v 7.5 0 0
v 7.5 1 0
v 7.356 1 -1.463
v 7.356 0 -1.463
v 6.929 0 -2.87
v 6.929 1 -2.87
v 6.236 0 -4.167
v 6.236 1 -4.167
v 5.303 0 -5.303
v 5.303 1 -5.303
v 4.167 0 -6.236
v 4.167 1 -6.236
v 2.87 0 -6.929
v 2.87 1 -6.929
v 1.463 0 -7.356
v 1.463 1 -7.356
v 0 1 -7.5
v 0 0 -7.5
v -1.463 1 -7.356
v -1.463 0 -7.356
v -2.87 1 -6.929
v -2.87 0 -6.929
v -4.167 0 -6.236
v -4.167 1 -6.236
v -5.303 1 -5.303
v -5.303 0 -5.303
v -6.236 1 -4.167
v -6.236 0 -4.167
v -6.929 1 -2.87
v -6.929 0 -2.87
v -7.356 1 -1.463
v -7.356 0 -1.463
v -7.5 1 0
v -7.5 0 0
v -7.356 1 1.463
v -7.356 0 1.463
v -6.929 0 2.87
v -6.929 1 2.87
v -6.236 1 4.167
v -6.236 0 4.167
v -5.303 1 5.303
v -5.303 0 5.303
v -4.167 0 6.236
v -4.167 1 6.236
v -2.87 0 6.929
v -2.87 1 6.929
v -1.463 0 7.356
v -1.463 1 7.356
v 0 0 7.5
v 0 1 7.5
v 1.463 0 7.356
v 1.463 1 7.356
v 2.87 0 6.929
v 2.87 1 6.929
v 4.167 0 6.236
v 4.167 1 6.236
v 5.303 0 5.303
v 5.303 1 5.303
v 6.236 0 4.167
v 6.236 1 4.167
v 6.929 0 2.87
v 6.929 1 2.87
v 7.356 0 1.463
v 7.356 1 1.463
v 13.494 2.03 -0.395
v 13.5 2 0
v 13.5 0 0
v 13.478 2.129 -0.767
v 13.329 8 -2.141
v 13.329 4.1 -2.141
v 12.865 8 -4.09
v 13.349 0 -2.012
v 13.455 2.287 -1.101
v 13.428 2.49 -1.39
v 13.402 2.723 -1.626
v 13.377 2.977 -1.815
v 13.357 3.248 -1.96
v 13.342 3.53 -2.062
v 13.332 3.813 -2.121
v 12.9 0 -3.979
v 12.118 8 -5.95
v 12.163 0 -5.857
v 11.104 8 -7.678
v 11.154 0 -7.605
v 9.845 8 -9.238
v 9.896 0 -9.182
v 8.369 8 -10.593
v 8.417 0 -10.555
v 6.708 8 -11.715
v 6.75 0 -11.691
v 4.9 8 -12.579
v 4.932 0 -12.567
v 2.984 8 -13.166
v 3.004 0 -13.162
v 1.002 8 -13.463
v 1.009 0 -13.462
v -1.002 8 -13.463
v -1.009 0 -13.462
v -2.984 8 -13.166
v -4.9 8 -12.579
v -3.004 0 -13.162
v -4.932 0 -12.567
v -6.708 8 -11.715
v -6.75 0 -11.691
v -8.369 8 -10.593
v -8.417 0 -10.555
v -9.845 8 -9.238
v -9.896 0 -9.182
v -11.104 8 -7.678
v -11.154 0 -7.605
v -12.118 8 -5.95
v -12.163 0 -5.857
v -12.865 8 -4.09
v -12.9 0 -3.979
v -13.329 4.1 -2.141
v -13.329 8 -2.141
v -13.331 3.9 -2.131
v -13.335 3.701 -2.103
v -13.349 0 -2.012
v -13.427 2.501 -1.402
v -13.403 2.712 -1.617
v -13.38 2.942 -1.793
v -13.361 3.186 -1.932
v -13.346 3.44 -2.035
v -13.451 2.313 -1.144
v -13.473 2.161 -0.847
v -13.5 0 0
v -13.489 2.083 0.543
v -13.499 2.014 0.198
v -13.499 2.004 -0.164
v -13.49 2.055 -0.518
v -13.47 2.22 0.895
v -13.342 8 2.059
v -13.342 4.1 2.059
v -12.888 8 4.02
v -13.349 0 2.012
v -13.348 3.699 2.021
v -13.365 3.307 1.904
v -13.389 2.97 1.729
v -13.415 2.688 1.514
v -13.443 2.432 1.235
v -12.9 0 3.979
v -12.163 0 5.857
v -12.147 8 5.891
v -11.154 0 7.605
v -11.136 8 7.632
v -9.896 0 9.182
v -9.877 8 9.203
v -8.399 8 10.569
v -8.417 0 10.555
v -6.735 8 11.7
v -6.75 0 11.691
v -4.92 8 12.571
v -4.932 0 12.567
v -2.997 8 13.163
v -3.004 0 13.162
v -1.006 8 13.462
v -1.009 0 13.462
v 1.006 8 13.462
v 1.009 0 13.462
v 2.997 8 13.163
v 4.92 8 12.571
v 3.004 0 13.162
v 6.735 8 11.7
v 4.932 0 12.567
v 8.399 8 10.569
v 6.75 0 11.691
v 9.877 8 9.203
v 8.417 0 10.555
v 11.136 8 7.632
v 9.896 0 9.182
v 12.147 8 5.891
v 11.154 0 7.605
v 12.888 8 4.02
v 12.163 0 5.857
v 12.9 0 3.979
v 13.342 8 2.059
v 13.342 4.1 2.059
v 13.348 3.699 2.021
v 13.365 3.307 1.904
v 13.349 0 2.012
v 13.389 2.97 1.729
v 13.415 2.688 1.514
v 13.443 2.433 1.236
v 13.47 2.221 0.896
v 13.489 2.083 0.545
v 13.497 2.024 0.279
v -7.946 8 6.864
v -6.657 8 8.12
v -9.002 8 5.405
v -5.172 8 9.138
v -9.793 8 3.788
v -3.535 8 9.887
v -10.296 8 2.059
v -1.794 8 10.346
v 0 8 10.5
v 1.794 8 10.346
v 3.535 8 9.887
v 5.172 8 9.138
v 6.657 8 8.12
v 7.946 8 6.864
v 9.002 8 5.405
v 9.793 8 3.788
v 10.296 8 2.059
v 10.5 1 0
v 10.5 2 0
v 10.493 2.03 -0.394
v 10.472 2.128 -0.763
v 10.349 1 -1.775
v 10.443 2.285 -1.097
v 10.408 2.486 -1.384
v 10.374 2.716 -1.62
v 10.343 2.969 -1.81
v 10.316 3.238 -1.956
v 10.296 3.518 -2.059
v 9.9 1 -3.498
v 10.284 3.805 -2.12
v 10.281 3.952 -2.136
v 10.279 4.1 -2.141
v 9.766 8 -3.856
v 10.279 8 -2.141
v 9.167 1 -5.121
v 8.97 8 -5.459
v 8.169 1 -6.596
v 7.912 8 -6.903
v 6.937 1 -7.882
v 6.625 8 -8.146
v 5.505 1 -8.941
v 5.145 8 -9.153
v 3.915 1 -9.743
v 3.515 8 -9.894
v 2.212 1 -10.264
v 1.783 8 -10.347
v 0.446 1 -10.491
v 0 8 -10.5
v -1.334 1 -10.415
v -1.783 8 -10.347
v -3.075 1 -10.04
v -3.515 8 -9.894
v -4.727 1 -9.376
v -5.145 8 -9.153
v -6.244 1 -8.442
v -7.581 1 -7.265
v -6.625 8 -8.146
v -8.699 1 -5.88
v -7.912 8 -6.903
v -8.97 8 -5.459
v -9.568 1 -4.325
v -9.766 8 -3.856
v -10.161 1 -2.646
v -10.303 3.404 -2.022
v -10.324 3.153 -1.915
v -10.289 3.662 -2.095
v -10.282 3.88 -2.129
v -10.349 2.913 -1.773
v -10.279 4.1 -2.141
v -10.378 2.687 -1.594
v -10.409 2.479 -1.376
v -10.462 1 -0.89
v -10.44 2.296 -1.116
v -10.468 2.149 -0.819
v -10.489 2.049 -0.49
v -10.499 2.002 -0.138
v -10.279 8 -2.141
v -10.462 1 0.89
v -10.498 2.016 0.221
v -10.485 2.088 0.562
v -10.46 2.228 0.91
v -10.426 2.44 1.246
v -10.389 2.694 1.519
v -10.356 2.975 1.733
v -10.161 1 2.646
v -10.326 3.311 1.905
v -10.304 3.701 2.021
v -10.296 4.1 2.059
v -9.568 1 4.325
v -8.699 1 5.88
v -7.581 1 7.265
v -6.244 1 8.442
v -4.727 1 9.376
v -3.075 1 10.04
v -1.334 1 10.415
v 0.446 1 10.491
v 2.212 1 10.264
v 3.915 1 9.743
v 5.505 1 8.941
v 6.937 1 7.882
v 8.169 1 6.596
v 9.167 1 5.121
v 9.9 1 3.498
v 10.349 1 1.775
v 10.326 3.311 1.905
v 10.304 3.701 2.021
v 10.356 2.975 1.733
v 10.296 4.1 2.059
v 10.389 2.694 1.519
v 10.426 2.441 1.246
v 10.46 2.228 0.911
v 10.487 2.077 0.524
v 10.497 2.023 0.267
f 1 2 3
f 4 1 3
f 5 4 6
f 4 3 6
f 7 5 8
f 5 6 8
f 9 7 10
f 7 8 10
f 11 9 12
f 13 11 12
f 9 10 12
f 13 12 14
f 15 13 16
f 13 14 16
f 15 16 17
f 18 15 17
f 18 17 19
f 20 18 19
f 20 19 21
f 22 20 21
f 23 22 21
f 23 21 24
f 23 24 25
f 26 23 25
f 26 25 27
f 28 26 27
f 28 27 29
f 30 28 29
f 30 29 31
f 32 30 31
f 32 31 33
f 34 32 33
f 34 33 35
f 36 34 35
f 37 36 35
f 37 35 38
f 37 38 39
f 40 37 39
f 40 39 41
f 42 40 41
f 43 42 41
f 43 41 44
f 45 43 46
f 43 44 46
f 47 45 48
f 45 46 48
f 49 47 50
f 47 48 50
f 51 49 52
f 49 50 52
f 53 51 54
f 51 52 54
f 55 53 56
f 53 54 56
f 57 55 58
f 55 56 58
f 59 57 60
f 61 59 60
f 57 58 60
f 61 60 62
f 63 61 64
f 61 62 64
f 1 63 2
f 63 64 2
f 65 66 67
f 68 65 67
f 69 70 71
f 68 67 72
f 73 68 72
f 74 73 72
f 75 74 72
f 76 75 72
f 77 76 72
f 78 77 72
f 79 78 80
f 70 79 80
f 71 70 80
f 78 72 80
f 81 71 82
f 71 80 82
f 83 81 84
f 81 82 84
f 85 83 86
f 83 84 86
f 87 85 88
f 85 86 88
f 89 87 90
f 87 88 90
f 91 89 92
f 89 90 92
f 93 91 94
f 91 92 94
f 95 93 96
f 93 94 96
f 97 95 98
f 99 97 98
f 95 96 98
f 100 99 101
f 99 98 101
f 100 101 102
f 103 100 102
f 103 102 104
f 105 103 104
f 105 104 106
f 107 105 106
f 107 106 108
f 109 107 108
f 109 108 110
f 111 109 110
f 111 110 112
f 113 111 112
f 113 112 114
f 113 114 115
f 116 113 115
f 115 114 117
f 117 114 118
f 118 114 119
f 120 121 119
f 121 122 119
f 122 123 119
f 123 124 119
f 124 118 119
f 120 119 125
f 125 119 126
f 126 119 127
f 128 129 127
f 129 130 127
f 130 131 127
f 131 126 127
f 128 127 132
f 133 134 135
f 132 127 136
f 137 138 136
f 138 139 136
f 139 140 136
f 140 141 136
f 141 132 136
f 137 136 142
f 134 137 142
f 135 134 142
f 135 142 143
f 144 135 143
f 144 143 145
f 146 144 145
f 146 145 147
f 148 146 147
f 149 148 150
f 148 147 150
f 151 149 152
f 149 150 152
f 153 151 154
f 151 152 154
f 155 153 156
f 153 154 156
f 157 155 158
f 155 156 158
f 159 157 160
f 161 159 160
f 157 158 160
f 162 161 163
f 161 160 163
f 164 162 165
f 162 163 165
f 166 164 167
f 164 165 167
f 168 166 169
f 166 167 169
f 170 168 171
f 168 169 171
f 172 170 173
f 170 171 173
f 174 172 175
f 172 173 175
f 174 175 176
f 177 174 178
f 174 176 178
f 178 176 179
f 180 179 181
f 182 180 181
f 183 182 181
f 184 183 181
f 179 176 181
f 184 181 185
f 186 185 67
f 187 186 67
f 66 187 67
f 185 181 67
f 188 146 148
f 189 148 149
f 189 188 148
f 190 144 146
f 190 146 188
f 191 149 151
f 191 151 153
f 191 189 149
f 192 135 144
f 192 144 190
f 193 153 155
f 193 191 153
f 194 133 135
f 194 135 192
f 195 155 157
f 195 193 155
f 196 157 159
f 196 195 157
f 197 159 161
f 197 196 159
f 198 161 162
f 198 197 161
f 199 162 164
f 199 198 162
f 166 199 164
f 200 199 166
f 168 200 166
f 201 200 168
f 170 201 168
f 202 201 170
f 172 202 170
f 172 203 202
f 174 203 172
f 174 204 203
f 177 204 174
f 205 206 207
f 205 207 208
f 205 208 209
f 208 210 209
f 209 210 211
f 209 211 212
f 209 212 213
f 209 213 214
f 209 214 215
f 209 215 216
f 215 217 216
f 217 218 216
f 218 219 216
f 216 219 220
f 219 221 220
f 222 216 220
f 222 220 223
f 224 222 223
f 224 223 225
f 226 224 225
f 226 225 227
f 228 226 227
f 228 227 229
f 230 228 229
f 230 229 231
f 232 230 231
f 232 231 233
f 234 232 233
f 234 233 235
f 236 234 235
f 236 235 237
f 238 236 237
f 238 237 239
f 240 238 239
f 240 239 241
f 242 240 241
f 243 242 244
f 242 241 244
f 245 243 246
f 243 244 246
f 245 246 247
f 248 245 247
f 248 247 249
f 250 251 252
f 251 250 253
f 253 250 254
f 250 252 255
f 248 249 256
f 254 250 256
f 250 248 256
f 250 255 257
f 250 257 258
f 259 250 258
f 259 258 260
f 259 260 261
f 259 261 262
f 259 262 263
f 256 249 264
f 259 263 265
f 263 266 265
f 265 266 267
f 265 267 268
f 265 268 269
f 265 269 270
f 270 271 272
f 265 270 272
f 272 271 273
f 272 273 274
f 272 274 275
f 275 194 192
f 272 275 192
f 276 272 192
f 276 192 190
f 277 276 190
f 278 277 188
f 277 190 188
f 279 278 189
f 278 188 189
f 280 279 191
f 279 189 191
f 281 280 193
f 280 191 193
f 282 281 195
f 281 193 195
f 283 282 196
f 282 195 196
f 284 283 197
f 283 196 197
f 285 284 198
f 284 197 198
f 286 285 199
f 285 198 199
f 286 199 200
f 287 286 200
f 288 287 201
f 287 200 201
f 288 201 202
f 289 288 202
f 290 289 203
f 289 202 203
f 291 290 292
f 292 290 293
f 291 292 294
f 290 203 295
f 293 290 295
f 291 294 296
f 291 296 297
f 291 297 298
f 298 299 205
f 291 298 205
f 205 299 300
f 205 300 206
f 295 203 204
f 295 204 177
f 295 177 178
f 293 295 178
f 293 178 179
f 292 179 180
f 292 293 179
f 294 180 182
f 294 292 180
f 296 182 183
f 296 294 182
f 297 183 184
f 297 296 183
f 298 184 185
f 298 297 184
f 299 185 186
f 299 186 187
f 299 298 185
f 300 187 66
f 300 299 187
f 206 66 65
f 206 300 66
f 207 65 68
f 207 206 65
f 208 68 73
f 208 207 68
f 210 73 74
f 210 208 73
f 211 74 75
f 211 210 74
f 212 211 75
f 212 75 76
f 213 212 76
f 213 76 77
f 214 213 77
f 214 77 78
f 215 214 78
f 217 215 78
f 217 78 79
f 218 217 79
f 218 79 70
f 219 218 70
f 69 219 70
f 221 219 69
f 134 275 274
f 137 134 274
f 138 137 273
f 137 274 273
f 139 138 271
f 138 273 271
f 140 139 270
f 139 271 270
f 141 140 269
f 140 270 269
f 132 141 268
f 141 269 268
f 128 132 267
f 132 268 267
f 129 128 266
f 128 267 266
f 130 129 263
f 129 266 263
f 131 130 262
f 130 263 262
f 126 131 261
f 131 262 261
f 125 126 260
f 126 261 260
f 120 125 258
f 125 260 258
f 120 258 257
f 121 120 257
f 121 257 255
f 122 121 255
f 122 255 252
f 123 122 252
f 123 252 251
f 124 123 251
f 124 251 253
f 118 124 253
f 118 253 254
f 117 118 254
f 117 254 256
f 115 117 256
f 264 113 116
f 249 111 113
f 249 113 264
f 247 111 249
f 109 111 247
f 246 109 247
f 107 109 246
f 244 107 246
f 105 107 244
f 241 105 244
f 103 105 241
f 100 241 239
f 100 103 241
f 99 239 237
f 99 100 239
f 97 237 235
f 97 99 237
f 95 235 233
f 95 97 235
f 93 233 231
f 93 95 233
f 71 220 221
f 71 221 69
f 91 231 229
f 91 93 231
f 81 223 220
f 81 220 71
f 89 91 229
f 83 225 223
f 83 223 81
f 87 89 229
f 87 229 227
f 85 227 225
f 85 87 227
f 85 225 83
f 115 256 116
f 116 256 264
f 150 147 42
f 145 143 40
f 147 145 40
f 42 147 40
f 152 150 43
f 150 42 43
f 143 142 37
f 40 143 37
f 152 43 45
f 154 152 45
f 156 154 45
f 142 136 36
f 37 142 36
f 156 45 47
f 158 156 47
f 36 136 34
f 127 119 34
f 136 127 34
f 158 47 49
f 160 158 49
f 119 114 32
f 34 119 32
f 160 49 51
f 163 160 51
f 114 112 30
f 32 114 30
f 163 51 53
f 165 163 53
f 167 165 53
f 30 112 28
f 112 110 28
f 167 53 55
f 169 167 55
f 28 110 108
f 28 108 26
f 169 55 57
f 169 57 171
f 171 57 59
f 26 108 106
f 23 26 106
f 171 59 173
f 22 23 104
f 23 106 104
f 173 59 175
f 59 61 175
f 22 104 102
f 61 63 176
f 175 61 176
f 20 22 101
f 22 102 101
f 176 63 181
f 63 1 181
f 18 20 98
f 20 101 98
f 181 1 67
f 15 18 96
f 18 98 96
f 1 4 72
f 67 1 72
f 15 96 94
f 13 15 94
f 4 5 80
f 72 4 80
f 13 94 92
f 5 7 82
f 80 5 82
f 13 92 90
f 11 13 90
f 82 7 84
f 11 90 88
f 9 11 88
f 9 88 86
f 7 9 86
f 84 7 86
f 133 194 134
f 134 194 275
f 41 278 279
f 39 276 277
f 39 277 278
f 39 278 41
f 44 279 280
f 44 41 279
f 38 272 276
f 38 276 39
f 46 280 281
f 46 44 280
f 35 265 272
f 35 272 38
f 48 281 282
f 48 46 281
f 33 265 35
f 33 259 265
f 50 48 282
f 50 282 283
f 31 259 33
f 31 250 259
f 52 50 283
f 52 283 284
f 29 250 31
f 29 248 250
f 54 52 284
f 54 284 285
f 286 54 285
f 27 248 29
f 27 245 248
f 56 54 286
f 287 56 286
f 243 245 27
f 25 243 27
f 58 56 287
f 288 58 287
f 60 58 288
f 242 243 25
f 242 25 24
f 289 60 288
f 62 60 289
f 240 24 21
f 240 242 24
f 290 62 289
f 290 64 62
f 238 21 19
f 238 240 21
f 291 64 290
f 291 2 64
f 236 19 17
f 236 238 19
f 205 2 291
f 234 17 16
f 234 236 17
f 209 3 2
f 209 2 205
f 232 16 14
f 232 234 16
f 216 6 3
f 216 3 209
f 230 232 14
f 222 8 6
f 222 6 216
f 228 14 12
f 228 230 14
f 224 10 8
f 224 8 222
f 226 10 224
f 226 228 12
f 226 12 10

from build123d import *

# Parameters (mm, degrees)
SCHIZZO1_R                    = 13.5
ESTRUSIONE_ESTRUSIONE1_DEPTH  = 8
SCHIZZO2_R                    = 10.5
TAGLIO_ESTRUSIONE1_DEPTH      = 7
SCHIZZO3_R                    = 7.5
TAGLIO_ESTRUSIONE2_DEPTH      = 2
TAGLIO_ESTRUSIONE4_DEPTH      = 14.5
TAGLIO_ESTRUSIONE4_DEPTH_BACK = 14.5


with BuildPart() as part:
    # Schizzo1 → Estrusione-Estrusione1 (new body)
    with BuildSketch(Plane(origin=(0, 0, 0), x_dir=(1, 0, 0), z_dir=(0, 1, 0))):
        Circle(SCHIZZO1_R)
    extrude(amount=ESTRUSIONE_ESTRUSIONE1_DEPTH)

    # Schizzo2 → Taglio-Estrusione1 (cut)
    with BuildSketch(Plane(origin=(0, 8, 0), x_dir=(1, 0, 0), z_dir=(0, 1, 0))):
        Circle(SCHIZZO2_R)
    extrude(amount=-TAGLIO_ESTRUSIONE1_DEPTH, mode=Mode.SUBTRACT)

    # Schizzo3 → Taglio-Estrusione2 (cut, through all)
    with BuildSketch(Plane(origin=(0, 1, 0), x_dir=(1, 0, 0), z_dir=(0, 1, 0))):
        Circle(SCHIZZO3_R)
    extrude(amount=-TAGLIO_ESTRUSIONE2_DEPTH, mode=Mode.SUBTRACT)

    # Schizzo4 → Taglio-Estrusione4 (cut, two sides)
    with BuildSketch(Plane(origin=(0, 0, 0), x_dir=(0, 0, -1), z_dir=(1, 0, 0))) as taglio_estrusione4_sk:
        with BuildLine():
            Line((2.140854023, 8), (-2.059200669, 8))
            Line((-2.059200669, 8), (-2.059200669, 4.1))
            ThreePointArc((-2.059200669, 4.1), (0.040826677, 1.999972654), (2.140854023, 4.1))
            Line((2.140854023, 4.1), (2.140854023, 8))
        make_face()
    extrude(amount=TAGLIO_ESTRUSIONE4_DEPTH, mode=Mode.SUBTRACT)
    extrude(taglio_estrusione4_sk.sketch, amount=-TAGLIO_ESTRUSIONE4_DEPTH_BACK, mode=Mode.SUBTRACT)


solid = part.part
